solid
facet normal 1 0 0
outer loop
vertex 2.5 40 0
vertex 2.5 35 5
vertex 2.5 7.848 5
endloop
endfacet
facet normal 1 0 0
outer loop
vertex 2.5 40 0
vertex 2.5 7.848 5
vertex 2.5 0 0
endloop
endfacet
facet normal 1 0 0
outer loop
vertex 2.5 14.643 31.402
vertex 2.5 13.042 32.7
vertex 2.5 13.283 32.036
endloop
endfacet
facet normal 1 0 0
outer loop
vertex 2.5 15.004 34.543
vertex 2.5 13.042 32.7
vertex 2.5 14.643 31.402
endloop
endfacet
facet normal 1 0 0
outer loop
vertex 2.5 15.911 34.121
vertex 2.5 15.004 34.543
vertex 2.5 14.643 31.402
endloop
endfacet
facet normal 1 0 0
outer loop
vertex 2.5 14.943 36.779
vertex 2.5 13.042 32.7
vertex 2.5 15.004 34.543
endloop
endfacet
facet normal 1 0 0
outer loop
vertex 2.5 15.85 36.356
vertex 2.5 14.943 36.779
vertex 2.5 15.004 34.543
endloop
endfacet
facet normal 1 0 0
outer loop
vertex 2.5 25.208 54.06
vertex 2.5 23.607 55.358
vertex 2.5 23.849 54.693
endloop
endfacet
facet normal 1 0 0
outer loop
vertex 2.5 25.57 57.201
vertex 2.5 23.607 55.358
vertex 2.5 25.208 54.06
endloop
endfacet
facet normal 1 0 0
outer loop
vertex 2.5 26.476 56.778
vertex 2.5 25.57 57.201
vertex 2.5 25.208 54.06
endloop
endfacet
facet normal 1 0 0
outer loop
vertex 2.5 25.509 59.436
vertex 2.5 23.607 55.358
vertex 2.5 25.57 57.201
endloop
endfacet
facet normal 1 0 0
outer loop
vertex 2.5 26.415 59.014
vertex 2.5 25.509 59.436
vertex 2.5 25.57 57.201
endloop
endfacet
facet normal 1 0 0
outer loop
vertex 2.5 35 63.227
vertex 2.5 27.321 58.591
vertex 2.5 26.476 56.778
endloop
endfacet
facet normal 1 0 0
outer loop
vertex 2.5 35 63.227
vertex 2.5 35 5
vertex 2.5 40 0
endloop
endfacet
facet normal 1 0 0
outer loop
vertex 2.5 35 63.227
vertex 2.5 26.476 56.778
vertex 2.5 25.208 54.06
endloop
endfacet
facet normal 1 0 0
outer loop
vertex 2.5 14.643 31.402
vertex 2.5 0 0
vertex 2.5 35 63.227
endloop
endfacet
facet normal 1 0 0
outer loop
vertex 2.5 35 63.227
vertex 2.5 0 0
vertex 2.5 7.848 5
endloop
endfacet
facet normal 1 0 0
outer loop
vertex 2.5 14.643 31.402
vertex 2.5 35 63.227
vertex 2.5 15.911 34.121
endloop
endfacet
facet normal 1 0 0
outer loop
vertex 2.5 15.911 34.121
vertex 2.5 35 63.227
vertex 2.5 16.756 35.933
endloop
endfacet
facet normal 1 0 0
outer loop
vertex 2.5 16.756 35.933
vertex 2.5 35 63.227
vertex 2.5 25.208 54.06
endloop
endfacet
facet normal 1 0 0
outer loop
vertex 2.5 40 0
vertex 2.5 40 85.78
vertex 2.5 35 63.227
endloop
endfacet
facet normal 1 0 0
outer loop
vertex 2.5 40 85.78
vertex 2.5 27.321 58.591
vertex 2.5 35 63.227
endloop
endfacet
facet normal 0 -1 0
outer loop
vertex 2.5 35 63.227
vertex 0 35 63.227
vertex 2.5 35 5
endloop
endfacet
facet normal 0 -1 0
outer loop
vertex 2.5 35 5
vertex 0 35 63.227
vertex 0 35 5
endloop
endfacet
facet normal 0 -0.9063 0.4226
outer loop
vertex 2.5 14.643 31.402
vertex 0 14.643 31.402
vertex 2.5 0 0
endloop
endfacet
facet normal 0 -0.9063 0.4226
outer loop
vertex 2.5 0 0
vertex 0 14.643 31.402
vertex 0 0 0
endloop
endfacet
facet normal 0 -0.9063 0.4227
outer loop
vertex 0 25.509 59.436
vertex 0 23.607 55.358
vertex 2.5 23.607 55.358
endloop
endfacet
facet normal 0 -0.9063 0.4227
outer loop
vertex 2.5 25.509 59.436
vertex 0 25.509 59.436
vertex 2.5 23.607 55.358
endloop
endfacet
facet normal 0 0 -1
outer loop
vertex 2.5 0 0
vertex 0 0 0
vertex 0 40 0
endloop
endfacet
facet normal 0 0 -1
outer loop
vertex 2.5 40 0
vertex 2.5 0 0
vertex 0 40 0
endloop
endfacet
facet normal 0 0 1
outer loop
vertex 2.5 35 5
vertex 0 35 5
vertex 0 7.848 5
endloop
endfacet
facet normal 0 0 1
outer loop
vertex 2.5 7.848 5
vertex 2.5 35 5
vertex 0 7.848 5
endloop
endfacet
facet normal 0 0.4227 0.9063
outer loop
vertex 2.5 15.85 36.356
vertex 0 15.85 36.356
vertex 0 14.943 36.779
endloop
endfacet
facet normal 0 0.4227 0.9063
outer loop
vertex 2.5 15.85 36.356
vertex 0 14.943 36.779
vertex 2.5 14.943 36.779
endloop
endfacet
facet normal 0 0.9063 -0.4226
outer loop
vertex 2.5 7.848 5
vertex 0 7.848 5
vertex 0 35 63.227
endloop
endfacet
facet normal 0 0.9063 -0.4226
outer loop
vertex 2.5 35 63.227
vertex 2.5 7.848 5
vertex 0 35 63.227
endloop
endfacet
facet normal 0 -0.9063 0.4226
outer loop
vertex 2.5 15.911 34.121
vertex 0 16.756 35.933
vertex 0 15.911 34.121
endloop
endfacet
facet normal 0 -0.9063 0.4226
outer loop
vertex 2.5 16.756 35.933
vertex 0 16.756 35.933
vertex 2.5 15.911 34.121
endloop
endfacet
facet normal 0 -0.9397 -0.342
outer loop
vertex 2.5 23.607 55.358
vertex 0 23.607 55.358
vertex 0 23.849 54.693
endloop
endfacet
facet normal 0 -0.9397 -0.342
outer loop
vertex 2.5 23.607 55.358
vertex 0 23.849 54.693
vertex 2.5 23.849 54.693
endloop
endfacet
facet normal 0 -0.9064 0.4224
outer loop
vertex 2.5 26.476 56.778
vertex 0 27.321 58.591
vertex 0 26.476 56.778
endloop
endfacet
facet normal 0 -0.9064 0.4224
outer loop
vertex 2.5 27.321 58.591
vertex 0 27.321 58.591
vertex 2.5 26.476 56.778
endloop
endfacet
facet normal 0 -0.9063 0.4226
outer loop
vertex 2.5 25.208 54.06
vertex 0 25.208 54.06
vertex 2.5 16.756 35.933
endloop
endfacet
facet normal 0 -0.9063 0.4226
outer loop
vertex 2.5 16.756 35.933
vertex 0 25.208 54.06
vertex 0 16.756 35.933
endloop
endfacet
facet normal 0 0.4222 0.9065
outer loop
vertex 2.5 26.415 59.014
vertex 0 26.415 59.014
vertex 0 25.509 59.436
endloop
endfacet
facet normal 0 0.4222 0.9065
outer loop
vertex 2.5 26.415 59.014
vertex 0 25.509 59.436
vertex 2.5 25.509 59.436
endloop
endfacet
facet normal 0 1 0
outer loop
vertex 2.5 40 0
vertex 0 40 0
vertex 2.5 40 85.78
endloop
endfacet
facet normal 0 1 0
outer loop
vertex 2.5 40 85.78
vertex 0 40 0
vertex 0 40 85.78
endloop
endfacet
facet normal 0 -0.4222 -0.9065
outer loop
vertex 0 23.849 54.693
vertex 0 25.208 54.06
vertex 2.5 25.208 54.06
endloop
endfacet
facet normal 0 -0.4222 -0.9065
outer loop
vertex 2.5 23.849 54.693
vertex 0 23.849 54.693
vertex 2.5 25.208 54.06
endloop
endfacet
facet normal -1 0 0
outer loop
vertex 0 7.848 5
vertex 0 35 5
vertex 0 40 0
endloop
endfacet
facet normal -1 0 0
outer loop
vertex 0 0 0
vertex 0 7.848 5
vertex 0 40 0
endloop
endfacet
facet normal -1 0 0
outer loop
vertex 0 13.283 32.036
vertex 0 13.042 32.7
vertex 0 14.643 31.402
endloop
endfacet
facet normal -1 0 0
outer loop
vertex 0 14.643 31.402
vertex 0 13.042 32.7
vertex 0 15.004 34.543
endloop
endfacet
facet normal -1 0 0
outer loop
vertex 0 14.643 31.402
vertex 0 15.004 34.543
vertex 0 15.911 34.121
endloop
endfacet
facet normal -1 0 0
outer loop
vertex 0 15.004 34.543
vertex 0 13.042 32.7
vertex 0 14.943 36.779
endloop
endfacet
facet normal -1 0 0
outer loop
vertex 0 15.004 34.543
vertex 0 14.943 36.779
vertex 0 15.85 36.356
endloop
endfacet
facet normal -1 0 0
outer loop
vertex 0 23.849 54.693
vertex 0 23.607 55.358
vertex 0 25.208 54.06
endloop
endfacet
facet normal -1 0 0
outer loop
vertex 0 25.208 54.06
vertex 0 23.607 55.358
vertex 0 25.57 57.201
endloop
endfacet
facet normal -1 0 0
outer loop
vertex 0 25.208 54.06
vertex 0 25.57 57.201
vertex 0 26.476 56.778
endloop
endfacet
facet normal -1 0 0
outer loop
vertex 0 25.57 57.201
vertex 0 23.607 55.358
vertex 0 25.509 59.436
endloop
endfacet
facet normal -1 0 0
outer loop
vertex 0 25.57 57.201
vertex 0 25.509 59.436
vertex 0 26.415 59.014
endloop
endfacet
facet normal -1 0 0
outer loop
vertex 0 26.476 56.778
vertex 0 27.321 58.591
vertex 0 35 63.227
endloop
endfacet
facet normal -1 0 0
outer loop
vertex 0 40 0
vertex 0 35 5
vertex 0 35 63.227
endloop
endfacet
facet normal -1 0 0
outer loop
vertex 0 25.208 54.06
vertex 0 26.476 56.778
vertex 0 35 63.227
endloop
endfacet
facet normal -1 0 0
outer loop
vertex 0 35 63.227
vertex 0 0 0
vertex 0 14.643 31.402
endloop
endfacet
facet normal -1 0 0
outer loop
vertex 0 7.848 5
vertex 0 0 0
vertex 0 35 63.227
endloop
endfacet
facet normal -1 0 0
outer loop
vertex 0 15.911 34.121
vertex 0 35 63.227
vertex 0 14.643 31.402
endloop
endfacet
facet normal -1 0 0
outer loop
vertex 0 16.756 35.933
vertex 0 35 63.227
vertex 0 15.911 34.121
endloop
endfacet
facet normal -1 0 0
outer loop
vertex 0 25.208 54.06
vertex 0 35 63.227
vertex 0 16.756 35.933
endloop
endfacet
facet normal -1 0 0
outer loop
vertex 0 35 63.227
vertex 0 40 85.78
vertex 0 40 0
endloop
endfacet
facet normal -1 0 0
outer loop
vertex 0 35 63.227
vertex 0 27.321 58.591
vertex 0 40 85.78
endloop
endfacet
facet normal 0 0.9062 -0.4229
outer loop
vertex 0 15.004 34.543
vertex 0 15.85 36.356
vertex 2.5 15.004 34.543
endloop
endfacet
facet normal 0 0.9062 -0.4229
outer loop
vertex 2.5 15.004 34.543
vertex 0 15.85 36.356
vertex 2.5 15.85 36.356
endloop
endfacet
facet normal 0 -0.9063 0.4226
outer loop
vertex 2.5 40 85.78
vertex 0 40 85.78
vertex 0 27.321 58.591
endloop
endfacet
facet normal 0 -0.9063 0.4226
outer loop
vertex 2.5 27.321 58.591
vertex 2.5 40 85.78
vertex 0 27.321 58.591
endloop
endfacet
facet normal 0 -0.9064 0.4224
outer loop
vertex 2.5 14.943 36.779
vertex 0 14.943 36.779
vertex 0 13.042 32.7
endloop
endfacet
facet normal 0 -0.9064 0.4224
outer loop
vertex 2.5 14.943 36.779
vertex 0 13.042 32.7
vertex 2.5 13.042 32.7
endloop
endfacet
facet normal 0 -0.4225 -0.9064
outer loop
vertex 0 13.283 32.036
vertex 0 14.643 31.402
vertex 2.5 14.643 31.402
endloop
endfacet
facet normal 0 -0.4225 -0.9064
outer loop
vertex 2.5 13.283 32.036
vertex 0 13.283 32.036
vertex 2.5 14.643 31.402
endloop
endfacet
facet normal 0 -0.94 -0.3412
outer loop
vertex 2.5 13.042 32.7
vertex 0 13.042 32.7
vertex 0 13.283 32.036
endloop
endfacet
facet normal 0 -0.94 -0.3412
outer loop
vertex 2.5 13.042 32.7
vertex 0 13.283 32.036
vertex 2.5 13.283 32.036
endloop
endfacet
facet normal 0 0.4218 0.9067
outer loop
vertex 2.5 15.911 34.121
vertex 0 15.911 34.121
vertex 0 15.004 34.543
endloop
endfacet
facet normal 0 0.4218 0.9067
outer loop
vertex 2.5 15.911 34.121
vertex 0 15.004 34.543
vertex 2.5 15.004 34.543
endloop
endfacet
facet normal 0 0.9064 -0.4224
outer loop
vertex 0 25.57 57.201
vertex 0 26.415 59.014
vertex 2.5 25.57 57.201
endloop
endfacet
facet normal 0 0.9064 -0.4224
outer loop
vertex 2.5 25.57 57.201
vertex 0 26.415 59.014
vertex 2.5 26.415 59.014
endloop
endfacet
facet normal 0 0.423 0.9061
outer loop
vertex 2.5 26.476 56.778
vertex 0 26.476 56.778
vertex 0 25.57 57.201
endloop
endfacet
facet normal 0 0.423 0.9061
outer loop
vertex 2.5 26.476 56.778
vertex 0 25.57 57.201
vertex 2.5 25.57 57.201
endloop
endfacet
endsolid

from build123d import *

# Parameters (mm, degrees)
F2_DEPTH = 2.5
F3_W     = 2.5
F3_H     = 5
F4_DEPTH = 2
F5_W     = 2.5
F5_H     = 1
F6_W     = 2.5
F6_H     = 1
F7_DEPTH = 2
F8_SIZE  = 0.5


with BuildPart() as f2:
    # F1 (on Right) → F2 (new body)
    with BuildSketch(Plane.YZ):
        Polygon((0, 0), (40, 0), (40, 85.7802768204), align=None)
        Polygon((35, 5), (7.8484278856, 5), (35, 63.2267343021), align=None, mode=Mode.SUBTRACT)
    extrude(amount=F2_DEPTH)

    # F3 (on face) → F4 (join)
    with BuildSketch(Plane(origin=(0, 0, 0), x_dir=(1, 0, 0), z_dir=(0, -0.906307787, 0.4226182617))):
        with Locations((1.25, 62.1480633261)):
            Rectangle(F3_W, F3_H)
        with Locations((1.25, 37.1480633261)):
            Rectangle(F3_W, F3_H)
    extrude(amount=F4_DEPTH)

    # F5 (on face) + F6 (on face) → F7 (cut)
    with BuildSketch(Plane(origin=(0, 27.3214521478, 58.5910432093), x_dir=(1, 0, 0), z_dir=(0, 0.4226182617, 0.906307787))):
        with Locations((1.25, -0.5)):
            Rectangle(F5_W, F5_H)
    with BuildSketch(Plane(origin=(0, 16.7559956043, 35.9333485334), x_dir=(1, 0, 0), z_dir=(0, 0.4226182617, 0.906307787))):
        with Locations((1.25, -0.5)):
            Rectangle(F6_W, F6_H)
    extrude(amount=-F7_DEPTH, mode=Mode.SUBTRACT)

    # F8
    f8_edges = [f2.edges().sort_by_distance(p)[0] for p in [
        (1.25, 12.830289, 32.247046),
        (1.25, 23.395745, 54.904741),
    ]]
    chamfer(f8_edges, length=F8_SIZE)


solid = f2.part
